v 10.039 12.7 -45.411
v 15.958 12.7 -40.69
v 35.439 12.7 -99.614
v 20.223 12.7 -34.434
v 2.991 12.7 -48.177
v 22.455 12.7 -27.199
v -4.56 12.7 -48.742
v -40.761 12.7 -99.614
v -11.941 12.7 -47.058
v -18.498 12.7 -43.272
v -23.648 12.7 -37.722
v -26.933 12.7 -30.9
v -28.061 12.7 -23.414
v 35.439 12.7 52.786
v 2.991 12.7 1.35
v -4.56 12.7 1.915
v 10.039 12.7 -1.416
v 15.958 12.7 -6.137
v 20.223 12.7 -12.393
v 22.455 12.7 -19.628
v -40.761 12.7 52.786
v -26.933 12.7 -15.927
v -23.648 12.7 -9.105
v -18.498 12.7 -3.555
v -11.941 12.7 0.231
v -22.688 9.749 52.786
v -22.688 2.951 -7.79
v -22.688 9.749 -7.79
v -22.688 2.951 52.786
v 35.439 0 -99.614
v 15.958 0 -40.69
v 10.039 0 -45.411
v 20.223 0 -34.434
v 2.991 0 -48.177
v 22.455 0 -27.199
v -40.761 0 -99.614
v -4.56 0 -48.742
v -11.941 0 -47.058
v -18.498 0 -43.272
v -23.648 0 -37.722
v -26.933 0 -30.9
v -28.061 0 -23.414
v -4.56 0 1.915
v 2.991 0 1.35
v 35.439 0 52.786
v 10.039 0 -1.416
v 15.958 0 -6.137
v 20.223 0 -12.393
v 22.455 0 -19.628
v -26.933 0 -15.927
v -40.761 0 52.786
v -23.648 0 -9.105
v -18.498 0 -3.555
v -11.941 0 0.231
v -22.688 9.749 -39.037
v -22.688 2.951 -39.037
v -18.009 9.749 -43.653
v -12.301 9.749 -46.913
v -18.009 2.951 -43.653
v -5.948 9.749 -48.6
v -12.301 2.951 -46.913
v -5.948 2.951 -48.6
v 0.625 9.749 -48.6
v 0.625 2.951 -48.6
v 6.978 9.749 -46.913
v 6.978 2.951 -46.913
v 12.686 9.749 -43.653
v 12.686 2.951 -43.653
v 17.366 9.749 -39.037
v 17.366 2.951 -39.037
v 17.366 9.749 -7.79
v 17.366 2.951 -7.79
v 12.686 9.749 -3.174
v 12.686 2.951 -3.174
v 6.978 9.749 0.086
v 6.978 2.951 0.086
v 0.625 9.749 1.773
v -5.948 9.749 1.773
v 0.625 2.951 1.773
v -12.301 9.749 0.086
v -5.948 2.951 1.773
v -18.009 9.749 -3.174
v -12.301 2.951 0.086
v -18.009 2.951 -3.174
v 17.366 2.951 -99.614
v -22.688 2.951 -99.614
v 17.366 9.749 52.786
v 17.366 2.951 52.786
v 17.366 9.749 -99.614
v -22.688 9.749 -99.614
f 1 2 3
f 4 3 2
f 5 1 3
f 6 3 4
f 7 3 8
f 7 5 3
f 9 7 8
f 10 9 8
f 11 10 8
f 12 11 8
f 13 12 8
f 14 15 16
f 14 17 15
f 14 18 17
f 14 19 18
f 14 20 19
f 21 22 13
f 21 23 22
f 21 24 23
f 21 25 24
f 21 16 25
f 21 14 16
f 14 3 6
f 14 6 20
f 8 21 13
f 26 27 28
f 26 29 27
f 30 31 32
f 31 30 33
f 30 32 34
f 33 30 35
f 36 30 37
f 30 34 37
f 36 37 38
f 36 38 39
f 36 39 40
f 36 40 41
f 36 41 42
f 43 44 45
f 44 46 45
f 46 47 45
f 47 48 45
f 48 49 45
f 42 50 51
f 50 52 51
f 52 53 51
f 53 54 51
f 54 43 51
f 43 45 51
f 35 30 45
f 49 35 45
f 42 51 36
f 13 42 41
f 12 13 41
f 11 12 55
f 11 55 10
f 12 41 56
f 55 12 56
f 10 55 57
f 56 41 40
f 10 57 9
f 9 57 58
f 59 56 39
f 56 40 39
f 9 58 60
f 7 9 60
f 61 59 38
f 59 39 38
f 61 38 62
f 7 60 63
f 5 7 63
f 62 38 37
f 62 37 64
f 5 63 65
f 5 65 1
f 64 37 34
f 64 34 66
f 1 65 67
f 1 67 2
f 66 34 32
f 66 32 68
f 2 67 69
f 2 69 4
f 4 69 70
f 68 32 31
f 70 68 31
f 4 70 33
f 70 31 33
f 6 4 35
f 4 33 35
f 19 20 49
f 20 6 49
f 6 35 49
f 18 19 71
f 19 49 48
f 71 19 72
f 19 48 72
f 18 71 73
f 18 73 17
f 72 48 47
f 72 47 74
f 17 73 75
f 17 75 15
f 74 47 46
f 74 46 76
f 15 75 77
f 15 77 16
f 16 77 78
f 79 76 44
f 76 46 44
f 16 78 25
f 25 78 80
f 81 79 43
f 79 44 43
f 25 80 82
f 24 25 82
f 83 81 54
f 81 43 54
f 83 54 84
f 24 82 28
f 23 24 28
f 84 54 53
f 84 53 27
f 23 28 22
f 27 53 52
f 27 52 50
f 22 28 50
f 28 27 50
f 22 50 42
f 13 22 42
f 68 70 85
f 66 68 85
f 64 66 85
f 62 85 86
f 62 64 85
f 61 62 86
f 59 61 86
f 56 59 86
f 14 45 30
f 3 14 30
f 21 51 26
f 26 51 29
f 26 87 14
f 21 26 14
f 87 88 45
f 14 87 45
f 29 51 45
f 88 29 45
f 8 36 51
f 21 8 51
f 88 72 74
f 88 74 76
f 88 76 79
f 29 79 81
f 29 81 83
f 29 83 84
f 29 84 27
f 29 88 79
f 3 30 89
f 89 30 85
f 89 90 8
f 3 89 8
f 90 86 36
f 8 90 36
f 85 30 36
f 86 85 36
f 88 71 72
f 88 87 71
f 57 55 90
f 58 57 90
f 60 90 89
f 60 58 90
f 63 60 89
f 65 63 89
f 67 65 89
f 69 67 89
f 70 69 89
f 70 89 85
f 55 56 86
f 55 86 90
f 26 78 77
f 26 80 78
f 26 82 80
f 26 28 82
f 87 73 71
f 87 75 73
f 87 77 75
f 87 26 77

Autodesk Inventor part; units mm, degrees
ref_plane "YZ Plane" through (0, 0, 0) normal (1, 0, 0) x (0, 1, 0)
ref_plane "XZ Plane" through (0, 0, 0) normal (0, 1, 0) x (-1, 0, 0)
ref_plane "XY Plane" through (0, 0, 0) normal (0, 0, 1) x (1, 0, 0)
sketch "Sketch1" plane through (0, 0, 0) normal (0, 1, 0) x (-1, 0, 0)
  line L0 (40.7614, 52.7865) -> (-35.4386, 52.7865)
  line L1 (-35.4386, 52.7865) -> (-35.4386, -99.6135)
  line L2 (-35.4386, -99.6135) -> (40.7614, -99.6135)
  line L3 (40.7614, -99.6135) -> (40.7614, 52.7865)
  circle A0 centre (2.6614, -23.4135) radius 25.4
  point P0 (0, 0)
  dimension "d0" = 152.4
  dimension "d1" = 76.2
  dimension "d2" = 50.8
  dimension "d5" = 76.2
  dimension "d6" = 38.1
extrude "Extrusion1" add sketch "Sketch1" along normal blind 12.7
sketch "Sketch2" plane through (-40.7614, 0, 52.7865) normal (0, 0, 1) x (1, 0, 0)
  line L0 (18.073, 9.7491) -> (58.127, 9.7491)
  line L1 (58.127, 9.7491) -> (58.127, 2.9509)
  line L2 (58.127, 2.9509) -> (18.073, 2.9509)
  line L3 (18.073, 2.9509) -> (18.073, 9.7491)
  line L4 (0, 12.7) -> (76.2, 12.7) projected
  line L5 (76.2, 0) -> (76.2, 12.7) projected
  line L6 (0, 0) -> (76.2, 0) projected
  line L7 (0, 0) -> (0, 12.7) projected
  point P0 (40.7614, 0)
  dimension "d9" = 2.9509
  dimension "d10" = 18.073
  dimension "d12" = 2.9509
  dimension "d13" = 18.073
extrude "Extrusion2" cut sketch "Sketch2" against normal up to surface (152.4 mm away) contours L0 L1 L2 L3
equation "\"d1\" = 0.5 * d0"
equation "\"d5\" = 0.5 * d0"
equation "\"d6\" = 0.5 * d1"
equation "\"d12\" = d9"
equation "\"d13\" = d10"
properties part number "Peg toy top"
